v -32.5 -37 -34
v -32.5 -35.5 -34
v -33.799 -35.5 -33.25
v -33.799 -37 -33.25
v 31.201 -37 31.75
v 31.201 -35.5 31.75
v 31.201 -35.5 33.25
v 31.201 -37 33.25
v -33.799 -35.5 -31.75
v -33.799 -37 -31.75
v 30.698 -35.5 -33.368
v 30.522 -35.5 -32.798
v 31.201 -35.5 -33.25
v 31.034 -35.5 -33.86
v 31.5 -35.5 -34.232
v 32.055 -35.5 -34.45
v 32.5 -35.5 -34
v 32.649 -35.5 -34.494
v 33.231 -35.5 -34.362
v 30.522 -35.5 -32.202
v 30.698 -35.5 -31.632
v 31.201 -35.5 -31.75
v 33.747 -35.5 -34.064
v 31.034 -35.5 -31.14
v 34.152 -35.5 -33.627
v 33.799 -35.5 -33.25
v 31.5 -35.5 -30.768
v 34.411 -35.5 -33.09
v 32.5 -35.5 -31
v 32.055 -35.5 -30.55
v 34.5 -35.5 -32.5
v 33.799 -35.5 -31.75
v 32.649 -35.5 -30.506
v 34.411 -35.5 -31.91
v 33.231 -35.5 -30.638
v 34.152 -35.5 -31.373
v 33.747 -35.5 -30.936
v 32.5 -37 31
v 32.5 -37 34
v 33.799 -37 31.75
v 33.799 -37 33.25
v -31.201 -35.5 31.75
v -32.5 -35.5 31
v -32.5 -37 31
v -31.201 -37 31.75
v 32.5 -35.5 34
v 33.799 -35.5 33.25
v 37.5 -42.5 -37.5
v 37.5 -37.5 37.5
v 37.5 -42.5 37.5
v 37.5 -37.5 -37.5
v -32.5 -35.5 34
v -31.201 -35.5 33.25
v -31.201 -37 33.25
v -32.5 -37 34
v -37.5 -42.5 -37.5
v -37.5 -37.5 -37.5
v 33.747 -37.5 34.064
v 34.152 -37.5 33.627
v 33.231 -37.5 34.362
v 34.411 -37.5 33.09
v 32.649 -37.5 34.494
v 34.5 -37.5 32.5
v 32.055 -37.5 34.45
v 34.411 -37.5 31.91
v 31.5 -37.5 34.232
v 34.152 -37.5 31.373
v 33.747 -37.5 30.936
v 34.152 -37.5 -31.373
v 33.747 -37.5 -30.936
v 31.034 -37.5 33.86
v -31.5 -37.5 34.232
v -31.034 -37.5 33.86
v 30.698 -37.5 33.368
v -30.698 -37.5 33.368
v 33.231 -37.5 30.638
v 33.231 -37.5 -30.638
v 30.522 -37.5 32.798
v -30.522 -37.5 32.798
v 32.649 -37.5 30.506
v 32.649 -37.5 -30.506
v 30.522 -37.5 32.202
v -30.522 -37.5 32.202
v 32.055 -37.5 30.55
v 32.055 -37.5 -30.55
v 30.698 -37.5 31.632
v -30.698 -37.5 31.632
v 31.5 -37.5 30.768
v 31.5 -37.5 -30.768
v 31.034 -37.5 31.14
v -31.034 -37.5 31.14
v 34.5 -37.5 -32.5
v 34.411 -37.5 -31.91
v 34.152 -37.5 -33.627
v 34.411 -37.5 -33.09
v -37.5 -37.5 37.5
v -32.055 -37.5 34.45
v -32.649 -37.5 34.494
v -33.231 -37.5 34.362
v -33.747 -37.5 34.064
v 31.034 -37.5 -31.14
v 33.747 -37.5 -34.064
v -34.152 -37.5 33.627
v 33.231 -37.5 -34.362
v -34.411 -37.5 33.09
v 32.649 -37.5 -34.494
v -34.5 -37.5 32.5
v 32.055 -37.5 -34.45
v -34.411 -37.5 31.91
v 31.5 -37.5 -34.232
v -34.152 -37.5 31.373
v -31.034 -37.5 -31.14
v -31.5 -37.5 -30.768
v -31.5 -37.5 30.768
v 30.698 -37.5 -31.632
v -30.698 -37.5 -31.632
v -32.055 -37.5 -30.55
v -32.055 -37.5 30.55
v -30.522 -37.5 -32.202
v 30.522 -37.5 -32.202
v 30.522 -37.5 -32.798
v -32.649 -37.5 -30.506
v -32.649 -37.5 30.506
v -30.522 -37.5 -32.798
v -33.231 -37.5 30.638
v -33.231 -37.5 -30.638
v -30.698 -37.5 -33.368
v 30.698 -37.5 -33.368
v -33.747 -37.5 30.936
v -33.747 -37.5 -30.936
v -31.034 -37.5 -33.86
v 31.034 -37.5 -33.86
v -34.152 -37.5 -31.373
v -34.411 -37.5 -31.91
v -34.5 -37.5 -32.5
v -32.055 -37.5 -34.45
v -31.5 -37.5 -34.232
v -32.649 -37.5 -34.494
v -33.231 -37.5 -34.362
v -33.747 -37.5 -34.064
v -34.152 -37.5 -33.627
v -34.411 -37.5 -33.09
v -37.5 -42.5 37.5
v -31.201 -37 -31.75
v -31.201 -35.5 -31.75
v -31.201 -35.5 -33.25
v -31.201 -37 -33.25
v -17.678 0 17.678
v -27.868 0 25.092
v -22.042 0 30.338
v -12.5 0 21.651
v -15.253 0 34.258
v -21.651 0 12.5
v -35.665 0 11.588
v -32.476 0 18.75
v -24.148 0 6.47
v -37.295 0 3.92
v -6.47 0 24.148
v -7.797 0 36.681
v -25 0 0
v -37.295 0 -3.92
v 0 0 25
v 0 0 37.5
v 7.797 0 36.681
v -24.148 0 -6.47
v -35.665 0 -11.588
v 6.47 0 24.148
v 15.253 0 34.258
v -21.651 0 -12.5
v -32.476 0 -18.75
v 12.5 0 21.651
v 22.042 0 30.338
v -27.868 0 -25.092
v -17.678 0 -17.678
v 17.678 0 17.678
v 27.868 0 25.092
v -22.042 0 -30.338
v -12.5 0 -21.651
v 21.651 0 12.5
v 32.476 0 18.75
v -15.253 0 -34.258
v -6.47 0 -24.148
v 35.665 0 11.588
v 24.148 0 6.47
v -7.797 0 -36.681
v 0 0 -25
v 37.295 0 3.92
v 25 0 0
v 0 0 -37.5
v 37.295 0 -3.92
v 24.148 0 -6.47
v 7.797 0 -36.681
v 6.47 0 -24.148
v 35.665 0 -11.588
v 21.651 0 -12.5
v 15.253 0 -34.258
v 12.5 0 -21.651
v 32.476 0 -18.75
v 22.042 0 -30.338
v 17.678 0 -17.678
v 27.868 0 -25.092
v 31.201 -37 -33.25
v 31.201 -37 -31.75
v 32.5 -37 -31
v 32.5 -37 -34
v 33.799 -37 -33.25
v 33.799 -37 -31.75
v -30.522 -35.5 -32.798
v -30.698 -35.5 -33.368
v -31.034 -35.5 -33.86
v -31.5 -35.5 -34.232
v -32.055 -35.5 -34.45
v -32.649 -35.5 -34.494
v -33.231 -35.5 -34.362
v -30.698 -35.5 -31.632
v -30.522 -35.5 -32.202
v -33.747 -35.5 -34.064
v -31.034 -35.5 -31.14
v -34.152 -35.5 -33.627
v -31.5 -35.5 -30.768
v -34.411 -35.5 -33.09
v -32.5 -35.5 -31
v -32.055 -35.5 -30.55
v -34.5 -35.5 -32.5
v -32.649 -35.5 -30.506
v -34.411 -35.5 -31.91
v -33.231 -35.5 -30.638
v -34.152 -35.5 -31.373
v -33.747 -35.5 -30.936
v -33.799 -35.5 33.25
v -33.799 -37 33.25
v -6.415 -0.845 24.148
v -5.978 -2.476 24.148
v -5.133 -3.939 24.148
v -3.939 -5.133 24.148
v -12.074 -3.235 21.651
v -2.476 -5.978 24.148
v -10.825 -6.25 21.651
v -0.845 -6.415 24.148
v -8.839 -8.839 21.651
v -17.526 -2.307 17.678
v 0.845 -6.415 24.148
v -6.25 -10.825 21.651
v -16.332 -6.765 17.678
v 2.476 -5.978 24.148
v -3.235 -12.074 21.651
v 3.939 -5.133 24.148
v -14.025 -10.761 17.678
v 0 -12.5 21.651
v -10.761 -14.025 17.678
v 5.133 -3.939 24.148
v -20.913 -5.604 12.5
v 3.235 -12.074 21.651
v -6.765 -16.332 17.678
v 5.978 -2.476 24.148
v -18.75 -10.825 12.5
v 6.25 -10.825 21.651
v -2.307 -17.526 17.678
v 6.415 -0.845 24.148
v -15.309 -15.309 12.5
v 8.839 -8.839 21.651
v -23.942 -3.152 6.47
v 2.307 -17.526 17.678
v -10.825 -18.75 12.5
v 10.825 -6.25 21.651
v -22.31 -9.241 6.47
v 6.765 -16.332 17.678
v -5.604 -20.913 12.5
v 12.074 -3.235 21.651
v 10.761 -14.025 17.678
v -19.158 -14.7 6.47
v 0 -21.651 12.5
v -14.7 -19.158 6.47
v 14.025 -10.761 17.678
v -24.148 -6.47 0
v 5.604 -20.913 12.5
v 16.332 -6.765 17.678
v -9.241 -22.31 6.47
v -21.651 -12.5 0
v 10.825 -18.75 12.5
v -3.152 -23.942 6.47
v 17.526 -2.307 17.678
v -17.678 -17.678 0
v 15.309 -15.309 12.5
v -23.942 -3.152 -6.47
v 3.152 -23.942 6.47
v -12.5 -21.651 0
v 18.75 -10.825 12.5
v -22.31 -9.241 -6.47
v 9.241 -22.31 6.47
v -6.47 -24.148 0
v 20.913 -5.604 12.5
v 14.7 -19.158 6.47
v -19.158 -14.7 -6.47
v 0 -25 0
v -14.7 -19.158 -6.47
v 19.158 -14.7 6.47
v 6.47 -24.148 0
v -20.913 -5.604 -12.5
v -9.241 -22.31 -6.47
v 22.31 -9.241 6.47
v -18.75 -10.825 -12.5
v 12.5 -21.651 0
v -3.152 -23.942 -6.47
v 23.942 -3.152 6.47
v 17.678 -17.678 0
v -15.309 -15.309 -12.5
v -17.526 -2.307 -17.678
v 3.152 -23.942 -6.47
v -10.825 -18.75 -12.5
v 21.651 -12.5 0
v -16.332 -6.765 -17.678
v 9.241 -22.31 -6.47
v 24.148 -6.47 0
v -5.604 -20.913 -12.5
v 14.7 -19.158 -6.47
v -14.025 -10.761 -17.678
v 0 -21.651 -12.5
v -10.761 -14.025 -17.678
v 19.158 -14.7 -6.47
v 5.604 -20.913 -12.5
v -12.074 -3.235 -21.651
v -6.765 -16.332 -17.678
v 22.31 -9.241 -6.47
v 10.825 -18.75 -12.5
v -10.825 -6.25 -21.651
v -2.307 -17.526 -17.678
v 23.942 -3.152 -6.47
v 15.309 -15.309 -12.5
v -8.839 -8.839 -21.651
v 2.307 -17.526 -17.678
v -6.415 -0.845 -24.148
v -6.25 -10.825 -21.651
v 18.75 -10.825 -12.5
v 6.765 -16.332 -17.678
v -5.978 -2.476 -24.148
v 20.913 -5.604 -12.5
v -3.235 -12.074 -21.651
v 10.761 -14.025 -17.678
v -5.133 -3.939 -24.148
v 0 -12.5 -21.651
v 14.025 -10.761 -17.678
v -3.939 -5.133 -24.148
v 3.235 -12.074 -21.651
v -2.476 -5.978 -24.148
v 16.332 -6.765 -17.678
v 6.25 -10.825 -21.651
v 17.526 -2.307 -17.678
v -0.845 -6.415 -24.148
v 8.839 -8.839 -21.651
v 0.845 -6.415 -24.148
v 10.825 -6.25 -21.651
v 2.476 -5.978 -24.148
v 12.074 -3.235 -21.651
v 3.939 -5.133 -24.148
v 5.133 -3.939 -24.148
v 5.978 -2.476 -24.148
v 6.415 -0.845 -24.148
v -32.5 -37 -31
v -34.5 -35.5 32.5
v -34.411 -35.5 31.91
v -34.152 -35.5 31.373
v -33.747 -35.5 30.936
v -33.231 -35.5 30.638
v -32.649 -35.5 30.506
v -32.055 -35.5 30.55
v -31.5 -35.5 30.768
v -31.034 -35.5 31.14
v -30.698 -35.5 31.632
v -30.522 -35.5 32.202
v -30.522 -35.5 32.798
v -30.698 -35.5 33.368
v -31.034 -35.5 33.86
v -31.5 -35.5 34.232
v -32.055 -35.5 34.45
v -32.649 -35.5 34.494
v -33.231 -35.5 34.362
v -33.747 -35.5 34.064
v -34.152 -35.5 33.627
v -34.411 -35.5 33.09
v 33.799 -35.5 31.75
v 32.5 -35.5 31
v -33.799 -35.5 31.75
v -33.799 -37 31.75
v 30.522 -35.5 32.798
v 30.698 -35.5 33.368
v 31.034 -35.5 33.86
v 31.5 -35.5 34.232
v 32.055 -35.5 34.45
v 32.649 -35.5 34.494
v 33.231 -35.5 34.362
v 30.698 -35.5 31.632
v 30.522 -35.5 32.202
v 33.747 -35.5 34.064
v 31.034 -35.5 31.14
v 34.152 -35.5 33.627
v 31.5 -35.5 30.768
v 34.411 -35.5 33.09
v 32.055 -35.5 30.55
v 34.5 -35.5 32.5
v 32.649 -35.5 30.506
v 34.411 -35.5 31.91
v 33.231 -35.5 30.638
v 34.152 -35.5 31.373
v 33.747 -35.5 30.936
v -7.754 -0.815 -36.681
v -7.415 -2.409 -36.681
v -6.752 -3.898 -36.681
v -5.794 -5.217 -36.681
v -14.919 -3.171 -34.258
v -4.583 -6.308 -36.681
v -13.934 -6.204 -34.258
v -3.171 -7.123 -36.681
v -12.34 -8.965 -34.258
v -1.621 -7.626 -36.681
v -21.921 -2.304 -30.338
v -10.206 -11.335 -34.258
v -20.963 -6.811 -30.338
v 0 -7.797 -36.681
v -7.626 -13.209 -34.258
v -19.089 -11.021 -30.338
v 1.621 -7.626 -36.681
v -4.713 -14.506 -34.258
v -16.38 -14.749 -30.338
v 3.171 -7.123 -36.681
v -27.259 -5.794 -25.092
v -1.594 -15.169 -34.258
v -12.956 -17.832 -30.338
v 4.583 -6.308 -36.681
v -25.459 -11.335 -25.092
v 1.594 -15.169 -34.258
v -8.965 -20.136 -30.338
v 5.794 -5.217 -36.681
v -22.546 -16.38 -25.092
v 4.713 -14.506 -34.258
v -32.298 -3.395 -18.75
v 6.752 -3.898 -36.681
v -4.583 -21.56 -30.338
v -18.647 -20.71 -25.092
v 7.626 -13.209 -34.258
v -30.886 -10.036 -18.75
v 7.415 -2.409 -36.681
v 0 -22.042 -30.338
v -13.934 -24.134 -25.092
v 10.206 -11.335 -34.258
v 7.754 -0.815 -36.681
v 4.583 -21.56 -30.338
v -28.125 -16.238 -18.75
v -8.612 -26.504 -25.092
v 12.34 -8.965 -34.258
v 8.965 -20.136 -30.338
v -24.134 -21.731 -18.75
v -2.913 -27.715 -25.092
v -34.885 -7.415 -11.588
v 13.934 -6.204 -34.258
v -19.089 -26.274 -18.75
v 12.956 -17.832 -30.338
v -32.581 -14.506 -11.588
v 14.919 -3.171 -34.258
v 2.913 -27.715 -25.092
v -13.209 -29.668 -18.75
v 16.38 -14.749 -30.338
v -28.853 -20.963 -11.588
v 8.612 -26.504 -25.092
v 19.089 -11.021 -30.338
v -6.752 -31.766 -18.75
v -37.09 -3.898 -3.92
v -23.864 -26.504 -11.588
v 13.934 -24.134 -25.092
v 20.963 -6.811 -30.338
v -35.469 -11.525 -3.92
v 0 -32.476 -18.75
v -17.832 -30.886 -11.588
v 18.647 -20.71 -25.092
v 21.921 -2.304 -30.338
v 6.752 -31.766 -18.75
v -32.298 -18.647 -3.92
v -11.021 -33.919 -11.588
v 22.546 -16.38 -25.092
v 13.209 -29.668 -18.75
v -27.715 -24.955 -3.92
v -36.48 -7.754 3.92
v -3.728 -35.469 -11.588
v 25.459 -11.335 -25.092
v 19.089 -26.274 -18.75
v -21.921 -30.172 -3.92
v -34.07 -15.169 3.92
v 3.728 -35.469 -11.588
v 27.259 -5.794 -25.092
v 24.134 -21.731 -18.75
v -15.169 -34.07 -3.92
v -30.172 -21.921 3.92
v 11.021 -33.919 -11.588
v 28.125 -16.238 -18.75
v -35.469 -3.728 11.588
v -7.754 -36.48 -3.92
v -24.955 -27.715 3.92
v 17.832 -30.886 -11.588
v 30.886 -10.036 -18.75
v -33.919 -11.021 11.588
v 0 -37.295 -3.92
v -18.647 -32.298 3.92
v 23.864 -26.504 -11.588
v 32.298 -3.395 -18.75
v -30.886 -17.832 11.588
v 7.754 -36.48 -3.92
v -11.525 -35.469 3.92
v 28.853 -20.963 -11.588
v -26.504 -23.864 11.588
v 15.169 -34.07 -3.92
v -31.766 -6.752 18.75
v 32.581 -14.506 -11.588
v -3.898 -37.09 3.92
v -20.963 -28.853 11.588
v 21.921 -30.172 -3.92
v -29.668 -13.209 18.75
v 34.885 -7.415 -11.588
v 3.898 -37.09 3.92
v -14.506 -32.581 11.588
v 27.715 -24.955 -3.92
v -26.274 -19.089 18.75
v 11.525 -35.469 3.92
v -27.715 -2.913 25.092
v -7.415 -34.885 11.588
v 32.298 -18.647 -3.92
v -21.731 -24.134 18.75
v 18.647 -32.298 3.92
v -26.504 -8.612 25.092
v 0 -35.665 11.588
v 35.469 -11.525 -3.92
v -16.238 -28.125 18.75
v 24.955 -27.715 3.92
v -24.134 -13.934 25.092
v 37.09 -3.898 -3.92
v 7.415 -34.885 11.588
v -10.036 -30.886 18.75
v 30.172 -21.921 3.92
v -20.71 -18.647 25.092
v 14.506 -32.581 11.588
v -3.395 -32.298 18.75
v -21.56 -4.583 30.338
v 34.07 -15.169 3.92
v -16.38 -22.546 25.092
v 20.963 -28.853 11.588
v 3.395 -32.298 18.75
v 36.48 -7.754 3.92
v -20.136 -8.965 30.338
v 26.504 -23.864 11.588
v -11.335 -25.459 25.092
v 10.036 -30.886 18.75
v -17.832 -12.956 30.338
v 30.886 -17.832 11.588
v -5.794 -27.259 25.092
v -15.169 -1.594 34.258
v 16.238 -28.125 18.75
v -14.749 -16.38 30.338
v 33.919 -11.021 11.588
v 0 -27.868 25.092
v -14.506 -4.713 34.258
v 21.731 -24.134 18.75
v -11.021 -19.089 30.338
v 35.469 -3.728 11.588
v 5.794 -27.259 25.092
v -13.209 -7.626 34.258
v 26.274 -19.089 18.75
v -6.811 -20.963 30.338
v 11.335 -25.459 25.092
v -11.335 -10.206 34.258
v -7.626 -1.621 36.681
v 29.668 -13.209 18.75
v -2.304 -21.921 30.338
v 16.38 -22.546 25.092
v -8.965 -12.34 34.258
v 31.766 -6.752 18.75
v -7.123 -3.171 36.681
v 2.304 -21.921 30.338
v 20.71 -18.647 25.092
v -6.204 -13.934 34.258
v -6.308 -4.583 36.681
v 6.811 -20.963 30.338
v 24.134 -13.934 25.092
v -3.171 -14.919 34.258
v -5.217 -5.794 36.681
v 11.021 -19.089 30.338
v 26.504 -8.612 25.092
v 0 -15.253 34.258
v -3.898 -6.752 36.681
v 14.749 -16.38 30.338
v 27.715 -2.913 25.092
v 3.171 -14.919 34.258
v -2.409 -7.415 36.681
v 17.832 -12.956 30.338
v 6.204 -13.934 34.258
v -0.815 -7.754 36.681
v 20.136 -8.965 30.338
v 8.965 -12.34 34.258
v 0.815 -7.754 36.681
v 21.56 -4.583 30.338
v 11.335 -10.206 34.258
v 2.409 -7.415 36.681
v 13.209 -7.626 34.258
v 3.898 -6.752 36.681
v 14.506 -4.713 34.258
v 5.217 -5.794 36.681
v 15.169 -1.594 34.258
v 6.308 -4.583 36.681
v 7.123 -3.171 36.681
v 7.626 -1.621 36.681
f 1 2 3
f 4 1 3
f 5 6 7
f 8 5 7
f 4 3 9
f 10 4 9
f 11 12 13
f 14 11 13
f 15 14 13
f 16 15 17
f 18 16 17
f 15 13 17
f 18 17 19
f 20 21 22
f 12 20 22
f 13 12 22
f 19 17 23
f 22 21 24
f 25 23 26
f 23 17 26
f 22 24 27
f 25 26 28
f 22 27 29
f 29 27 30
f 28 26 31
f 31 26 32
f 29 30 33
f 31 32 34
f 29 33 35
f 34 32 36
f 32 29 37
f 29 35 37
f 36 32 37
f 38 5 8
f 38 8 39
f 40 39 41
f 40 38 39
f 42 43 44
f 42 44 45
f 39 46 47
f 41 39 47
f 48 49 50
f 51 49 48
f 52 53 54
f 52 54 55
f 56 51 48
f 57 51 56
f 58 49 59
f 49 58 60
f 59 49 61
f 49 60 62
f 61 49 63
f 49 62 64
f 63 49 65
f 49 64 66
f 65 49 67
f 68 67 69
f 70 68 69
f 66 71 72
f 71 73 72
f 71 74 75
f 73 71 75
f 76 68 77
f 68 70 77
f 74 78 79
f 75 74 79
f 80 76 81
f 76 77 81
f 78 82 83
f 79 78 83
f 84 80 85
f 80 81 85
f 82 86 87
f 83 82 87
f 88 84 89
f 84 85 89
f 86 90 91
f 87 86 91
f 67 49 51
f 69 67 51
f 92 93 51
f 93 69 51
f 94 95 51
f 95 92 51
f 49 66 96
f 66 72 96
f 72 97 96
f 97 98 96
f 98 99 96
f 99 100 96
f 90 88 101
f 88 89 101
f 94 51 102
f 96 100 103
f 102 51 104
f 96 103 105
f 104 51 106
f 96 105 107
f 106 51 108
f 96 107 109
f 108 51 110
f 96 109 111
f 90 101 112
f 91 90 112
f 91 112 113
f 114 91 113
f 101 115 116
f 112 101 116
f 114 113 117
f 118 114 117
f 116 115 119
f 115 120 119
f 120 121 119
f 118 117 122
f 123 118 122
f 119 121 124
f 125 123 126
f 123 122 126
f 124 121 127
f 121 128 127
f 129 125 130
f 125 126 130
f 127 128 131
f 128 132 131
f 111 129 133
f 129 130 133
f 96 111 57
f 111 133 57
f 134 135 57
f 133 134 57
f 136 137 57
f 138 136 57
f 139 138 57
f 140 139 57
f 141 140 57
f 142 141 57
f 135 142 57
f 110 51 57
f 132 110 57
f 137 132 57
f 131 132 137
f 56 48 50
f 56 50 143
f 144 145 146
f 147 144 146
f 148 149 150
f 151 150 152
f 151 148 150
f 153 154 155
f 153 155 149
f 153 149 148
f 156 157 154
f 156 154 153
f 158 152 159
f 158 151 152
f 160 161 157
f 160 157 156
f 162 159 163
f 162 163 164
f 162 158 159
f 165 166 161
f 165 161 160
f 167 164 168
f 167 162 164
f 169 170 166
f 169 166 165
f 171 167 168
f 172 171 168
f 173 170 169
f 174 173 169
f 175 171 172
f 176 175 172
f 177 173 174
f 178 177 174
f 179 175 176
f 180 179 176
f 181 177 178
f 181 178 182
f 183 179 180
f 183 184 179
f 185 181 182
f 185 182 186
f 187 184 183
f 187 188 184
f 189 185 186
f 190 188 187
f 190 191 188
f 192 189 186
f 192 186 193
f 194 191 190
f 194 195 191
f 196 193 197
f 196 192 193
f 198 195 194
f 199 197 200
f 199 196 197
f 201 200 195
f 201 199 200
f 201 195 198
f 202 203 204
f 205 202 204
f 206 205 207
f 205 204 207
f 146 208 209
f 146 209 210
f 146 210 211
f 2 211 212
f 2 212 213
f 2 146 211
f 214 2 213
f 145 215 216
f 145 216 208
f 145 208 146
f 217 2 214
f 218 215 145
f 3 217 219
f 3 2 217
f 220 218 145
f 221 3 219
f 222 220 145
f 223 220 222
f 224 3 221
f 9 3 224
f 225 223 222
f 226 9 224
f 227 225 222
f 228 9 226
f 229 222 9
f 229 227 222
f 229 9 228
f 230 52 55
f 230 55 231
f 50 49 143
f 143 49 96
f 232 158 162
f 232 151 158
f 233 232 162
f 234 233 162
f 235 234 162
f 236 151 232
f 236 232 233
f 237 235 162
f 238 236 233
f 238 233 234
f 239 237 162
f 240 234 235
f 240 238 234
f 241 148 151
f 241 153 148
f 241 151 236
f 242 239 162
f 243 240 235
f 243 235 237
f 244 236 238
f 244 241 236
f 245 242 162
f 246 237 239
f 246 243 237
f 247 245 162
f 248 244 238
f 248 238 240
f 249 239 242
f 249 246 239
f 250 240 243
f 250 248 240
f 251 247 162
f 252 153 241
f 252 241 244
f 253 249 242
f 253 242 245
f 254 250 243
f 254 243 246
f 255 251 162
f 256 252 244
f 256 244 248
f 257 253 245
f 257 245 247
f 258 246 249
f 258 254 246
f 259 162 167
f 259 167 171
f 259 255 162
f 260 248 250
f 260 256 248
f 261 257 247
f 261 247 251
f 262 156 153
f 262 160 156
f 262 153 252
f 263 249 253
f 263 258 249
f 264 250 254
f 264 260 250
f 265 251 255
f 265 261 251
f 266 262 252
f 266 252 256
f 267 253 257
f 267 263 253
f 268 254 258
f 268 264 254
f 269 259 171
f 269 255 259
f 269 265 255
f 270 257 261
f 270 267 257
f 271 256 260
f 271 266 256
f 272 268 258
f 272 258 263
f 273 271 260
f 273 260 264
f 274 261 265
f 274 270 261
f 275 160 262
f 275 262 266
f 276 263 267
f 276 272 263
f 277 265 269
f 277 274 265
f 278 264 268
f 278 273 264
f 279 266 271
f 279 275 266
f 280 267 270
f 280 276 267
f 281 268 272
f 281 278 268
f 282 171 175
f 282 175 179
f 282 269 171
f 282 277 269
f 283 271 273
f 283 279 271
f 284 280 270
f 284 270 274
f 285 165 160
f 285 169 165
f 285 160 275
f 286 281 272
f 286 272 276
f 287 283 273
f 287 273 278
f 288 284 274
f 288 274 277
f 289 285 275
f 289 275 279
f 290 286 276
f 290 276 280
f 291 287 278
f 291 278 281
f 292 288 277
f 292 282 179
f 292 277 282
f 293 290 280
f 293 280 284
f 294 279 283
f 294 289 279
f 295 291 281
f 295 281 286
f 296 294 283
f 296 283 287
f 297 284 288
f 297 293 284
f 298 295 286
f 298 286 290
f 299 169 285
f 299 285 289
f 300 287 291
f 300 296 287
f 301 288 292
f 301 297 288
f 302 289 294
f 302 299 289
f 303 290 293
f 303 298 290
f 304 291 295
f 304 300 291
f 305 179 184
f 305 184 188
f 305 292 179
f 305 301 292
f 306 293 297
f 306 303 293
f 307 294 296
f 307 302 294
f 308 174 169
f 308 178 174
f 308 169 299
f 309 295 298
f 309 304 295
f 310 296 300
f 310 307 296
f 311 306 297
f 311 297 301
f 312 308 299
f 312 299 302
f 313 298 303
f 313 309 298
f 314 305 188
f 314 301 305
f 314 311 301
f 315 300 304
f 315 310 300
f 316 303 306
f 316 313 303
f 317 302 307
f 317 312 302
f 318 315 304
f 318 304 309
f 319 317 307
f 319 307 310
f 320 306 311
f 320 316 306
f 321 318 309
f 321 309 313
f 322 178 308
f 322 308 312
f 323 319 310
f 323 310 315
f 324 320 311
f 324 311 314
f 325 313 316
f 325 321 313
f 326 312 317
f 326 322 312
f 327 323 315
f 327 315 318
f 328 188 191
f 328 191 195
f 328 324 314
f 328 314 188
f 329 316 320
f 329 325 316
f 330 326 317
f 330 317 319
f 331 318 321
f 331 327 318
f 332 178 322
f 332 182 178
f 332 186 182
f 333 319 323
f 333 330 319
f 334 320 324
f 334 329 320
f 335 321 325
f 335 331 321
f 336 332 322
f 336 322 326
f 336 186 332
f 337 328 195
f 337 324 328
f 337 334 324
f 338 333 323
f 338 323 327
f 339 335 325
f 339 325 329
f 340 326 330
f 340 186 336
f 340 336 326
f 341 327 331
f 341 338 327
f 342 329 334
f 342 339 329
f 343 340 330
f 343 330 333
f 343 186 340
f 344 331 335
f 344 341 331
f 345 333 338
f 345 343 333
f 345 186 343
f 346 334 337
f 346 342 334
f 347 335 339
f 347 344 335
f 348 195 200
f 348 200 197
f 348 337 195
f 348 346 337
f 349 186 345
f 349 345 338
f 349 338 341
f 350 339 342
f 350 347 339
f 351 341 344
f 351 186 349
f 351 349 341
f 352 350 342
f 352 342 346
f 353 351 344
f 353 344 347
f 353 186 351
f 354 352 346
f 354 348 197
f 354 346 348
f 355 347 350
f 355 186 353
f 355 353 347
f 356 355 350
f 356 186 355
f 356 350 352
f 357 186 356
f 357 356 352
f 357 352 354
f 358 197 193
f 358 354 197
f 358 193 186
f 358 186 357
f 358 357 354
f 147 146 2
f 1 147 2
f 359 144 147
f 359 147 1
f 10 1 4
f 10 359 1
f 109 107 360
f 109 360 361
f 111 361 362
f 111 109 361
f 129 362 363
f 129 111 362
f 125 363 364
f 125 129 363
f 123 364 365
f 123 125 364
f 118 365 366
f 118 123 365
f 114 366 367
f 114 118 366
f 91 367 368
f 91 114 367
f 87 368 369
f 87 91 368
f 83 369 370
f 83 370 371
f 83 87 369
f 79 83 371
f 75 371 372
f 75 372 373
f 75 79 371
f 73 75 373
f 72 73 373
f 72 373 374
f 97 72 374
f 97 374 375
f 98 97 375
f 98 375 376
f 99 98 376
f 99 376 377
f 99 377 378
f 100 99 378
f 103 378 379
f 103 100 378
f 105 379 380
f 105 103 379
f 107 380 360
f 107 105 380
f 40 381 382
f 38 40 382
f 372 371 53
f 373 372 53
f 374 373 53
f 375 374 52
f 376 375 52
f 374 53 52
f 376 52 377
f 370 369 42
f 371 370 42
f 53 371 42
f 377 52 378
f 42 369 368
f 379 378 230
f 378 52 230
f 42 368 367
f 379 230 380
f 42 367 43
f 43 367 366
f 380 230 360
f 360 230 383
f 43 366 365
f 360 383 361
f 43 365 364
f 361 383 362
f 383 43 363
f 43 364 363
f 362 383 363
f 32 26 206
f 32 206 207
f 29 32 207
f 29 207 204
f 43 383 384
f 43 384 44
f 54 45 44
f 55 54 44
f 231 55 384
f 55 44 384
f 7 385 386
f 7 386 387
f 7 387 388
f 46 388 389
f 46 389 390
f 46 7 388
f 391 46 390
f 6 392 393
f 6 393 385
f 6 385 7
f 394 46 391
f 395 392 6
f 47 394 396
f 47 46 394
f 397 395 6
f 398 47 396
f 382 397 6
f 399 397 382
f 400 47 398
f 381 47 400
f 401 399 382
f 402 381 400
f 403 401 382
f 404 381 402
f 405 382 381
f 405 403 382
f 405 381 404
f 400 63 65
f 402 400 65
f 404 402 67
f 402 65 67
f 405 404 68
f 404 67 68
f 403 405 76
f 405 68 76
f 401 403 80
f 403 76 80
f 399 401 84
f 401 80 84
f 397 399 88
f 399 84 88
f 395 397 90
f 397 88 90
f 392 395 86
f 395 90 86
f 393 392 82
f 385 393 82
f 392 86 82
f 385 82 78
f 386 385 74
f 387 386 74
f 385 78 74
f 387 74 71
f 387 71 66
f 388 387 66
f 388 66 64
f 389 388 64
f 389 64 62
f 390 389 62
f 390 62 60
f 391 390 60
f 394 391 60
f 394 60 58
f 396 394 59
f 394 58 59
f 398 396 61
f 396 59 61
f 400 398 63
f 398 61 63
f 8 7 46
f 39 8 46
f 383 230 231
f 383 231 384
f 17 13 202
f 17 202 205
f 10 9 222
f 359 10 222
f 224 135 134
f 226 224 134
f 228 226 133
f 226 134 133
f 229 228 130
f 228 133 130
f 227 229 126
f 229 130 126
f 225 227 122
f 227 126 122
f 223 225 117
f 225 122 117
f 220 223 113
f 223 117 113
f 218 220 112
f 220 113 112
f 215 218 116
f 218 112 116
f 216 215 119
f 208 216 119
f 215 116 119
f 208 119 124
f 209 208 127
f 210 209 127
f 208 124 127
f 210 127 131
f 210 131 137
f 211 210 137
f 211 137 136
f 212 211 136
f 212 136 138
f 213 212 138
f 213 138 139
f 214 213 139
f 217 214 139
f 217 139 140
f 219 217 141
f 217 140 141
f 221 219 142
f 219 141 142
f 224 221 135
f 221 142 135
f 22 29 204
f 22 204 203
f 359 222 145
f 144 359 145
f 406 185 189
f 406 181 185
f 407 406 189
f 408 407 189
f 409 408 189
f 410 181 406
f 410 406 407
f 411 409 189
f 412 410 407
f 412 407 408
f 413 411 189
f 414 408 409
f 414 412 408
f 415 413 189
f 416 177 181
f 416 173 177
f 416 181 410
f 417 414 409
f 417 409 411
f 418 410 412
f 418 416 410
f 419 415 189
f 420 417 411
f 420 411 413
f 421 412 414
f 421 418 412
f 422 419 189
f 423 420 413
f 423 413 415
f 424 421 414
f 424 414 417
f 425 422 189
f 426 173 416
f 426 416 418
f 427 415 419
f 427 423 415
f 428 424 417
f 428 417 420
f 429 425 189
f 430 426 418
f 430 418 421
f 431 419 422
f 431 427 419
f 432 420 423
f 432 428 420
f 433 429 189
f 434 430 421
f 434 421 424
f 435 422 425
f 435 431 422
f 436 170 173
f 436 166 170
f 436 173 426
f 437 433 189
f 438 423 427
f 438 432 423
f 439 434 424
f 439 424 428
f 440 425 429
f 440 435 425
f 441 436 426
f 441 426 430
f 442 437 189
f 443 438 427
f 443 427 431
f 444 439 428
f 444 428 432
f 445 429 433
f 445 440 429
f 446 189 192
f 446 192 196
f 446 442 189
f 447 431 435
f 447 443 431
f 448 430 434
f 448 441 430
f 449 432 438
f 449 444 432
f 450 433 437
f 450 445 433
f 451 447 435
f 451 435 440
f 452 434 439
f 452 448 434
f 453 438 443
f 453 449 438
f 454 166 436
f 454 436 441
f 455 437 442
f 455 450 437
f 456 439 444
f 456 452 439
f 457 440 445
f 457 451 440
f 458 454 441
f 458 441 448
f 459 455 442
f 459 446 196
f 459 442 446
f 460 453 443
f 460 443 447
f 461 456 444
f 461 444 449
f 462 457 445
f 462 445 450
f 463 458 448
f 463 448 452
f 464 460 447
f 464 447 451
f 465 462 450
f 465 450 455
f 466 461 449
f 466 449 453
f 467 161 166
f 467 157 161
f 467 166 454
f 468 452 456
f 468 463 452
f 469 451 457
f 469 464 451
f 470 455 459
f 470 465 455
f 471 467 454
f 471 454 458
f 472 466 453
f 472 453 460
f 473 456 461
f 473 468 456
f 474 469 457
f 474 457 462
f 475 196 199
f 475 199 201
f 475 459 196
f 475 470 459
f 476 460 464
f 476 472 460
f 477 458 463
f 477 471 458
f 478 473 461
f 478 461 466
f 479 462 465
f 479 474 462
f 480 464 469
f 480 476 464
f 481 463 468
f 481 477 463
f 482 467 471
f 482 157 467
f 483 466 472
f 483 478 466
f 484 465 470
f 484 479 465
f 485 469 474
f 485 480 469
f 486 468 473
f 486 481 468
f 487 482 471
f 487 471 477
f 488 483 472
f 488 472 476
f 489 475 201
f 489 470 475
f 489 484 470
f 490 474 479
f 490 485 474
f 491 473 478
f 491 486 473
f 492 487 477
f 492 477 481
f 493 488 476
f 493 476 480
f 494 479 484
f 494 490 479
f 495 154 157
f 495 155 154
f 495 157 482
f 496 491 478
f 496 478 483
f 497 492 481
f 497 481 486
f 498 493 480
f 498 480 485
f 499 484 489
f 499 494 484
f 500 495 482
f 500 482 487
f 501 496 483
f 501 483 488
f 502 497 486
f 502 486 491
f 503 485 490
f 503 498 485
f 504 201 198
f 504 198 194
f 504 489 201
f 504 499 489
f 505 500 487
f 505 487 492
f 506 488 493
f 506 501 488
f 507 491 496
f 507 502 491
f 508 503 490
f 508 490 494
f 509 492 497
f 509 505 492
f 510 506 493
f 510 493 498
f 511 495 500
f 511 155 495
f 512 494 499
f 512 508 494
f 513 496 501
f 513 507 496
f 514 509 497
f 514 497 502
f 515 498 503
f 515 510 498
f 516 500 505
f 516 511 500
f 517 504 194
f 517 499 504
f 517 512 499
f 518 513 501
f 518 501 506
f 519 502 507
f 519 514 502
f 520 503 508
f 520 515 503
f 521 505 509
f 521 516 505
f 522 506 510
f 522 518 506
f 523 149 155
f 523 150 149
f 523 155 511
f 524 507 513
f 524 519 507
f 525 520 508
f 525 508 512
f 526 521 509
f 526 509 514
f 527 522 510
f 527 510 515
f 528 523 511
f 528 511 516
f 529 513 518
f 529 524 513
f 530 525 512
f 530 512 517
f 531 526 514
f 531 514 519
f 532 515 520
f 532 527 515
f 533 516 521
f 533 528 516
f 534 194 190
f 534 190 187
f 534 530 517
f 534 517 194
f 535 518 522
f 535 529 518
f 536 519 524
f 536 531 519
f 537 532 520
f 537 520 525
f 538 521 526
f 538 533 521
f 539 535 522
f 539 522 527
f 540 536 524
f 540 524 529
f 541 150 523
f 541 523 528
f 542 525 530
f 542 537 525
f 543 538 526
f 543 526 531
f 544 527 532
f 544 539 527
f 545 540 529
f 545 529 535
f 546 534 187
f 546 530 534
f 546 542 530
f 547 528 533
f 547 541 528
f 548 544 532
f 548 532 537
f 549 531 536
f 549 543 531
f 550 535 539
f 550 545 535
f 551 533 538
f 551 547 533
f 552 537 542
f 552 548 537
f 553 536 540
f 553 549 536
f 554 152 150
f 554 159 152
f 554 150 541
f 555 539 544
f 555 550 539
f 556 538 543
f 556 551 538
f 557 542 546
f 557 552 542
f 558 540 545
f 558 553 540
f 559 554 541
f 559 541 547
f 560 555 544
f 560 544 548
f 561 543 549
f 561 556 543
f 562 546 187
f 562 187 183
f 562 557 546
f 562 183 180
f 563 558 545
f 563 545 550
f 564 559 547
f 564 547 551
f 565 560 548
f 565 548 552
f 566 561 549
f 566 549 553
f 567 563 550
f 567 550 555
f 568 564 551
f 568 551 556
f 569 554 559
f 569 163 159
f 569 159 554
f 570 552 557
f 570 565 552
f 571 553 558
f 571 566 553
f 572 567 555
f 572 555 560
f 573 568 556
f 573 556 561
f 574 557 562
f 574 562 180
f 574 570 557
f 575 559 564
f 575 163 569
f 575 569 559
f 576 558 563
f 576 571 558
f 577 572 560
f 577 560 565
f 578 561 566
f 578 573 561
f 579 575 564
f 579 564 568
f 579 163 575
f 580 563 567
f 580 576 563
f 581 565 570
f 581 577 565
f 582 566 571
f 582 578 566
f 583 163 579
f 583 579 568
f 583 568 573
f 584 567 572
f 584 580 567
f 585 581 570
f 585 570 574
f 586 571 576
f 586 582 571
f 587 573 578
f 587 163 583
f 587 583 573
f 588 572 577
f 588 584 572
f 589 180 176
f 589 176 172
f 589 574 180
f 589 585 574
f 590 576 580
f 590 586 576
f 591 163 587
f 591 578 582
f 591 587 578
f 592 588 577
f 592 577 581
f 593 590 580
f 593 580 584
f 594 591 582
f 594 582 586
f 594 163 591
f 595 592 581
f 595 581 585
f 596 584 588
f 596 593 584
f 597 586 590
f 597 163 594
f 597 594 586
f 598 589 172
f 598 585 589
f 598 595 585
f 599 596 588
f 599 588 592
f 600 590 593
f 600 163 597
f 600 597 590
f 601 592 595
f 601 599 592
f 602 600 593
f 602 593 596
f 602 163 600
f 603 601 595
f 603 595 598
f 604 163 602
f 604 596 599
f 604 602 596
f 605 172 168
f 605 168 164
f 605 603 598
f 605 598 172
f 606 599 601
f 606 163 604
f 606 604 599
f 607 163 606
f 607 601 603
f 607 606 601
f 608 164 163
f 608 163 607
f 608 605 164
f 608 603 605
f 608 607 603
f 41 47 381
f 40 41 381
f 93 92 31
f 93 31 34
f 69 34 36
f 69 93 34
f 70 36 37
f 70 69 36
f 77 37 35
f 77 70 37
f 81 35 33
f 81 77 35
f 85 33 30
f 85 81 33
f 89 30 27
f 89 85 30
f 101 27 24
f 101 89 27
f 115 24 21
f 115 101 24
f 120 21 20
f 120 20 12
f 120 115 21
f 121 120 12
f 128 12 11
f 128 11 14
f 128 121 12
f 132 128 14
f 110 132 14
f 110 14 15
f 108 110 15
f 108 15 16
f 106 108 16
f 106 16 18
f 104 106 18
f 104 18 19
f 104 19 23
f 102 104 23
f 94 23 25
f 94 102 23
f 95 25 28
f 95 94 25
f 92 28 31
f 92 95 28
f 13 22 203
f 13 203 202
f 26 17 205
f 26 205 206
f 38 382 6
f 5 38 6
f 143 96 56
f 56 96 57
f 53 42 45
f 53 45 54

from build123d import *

# Parameters (mm, degrees)
REVOLVE3_ANGLE          = 180
SKETCH2_W               = 75
SKETCH2_H               = 75
BOSS_EXTRUDE1_DEPTH     = 5
SKETCH3_R               = 1.5
CUT_EXTRUDE1_DEPTH      = 5
SKETCH4_R               = 2
BOSS_EXTRUDE2_DEPTH     = 2
CUT_EXTRUDE2_DEPTH      = 1.5
BOSS_EXTRUDE3_REACH     = 69.961
SKETCH6_R               = 1.5
MIRROR2_COPY_1_SKETCH_R = 1.5
MIRROR2_COPY_1_DEPTH    = 5
MIRROR2_COPY_2_SKETCH_R = 2
MIRROR2_COPY_2_DEPTH    = 2
MIRROR2_COPY_3_DEPTH    = 1.5
MIRROR2_COPY_4_REACH    = 69.961
MIRROR2_COPY_4_SKETCH_R = 1.5
MIRROR2_COPY_5_SKETCH_R = 1.5
MIRROR2_COPY_5_DEPTH    = 5
MIRROR2_COPY_6_REACH    = 69.961
MIRROR2_COPY_6_SKETCH_R = 1.5


with BuildPart() as part:
    # Sketch1 → Revolve3 (revolve)
    with BuildSketch(Plane(origin=(0, 0, 0), x_dir=(1, 0, 0), z_dir=(0, 1, 0))):
        with BuildLine():
            Line((0, 25), (0, 37.5))
            ThreePointArc((0, 37.5), (-37.5, 0), (0, -37.5))
            Line((0, -37.5), (0, -25))
            ThreePointArc((0, -25), (-25, 0), (0, 25))
        make_face()
    revolve(axis=Axis((0, 0, -18.61408832), (0, 0, 1)), revolution_arc=REVOLVE3_ANGLE)


with BuildPart() as body_2:
    # Sketch2 → Boss-Extrude1 (new body)
    with BuildSketch(Plane(origin=(0, -37.5, 0), x_dir=(-1, 0, 0), z_dir=(0, -1, 0))):
        Rectangle(SKETCH2_W, SKETCH2_H)
    extrude(amount=BOSS_EXTRUDE1_DEPTH)

    # Sketch3 → Cut-Extrude1 (cut)
    with BuildSketch(Plane(origin=(0, -37.5, 0), x_dir=(1, 0, 0), z_dir=(0, 1, 0))):
        with Locations(Location((32.5, -32.5, 0), (0, 0, 180))):
            Circle(SKETCH3_R)
    cut_extrude1 = extrude(amount=-CUT_EXTRUDE1_DEPTH, mode=Mode.SUBTRACT)

    # Sketch4 → Boss-Extrude2 (add)
    with BuildSketch(Plane(origin=(0, -37.5, 0), x_dir=(1, 0, 0), z_dir=(0, 1, 0))):
        with Locations((32.5, -32.5)):
            Circle(SKETCH4_R)
    boss_extrude2 = extrude(amount=BOSS_EXTRUDE2_DEPTH)

    # Sketch5 → Cut-Extrude2 (cut)
    with BuildSketch(Plane(origin=(0, -35.5, 0), x_dir=(1, 0, 0), z_dir=(0, 1, 0))):
        Polygon((31.200961894, -31.75), (31.200961894, -33.25), (32.5, -34), (33.799038106, -33.25), (33.799038106, -31.75), (32.5, -31), align=None)
    cut_extrude2 = extrude(amount=-CUT_EXTRUDE2_DEPTH, mode=Mode.SUBTRACT)

    # Sketch6 → Boss-Extrude3 (add, up to next)
    with BuildSketch(Plane.XZ.offset(42.5), mode=Mode.PRIVATE) as boss_extrude3_sk1:
        with Locations((32.5, 32.5)):
            Circle(SKETCH6_R)
    boss_extrude3_tool1 = extrude(boss_extrude3_sk1.sketch, amount=-BOSS_EXTRUDE3_REACH, mode=Mode.PRIVATE) - body_2.part
    boss_extrude3 = boss_extrude3_tool1.solids().sort_by_distance((32.5, -42.5, 32.5))[0]
    add(boss_extrude3)

    # Mirror1: Cut-Extrude1, Boss-Extrude2, Cut-Extrude2, Boss-Extrude3 across plane
    add(cut_extrude1.mirror(Plane.XY), mode=Mode.SUBTRACT)
    add(boss_extrude2.mirror(Plane.XY))
    add(cut_extrude2.mirror(Plane.XY), mode=Mode.SUBTRACT)
    add(boss_extrude3.mirror(Plane.XY))

    # Mirror2: Boss-Extrude2, Cut-Extrude2 across plane
    add(boss_extrude2.mirror(Plane(origin=(0, 0, 0), x_dir=(0, 0, 1), z_dir=(1, 0, 0))))
    add(cut_extrude2.mirror(Plane(origin=(0, 0, 0), x_dir=(0, 0, 1), z_dir=(1, 0, 0))), mode=Mode.SUBTRACT)

    # Mirror2 copy 1 sketch → Mirror2 copy 1 (cut)
    with BuildSketch(Plane(origin=(0, -37.5, 0), x_dir=(-1, 0, 0), z_dir=(0, 1, 0))):
        with Locations(Location((32.5, -32.5, 0), (0, 0, 180))):
            Circle(MIRROR2_COPY_1_SKETCH_R)
    extrude(amount=-MIRROR2_COPY_1_DEPTH, mode=Mode.SUBTRACT)

    # Mirror2 copy 2 sketch → Mirror2 copy 2 (add)
    with BuildSketch(Plane(origin=(0, -37.5, 0), x_dir=(-1, 0, 0), z_dir=(0, 1, 0))):
        with Locations((32.5, -32.5)):
            Circle(MIRROR2_COPY_2_SKETCH_R)
    extrude(amount=MIRROR2_COPY_2_DEPTH)

    # Mirror2 copy 3 sketch → Mirror2 copy 3 (cut)
    with BuildSketch(Plane(origin=(0, -35.5, 0), x_dir=(-1, 0, 0), z_dir=(0, 1, 0))):
        Polygon((31.200961894, -31.75), (31.200961894, -33.25), (32.5, -34), (33.799038106, -33.25), (33.799038106, -31.75), (32.5, -31), align=None)
    extrude(amount=-MIRROR2_COPY_3_DEPTH, mode=Mode.SUBTRACT)

    # Mirror2 copy 4 sketch → Mirror2 copy 4 (add, up to next)
    with BuildSketch(Plane(origin=(0, -42.5, 0), x_dir=(-1, 0, 0), z_dir=(0, -1, 0)), mode=Mode.PRIVATE) as mirror2_copy_4_sk1:
        with Locations((32.5, 32.5)):
            Circle(MIRROR2_COPY_4_SKETCH_R)
    mirror2_copy_4_tool1 = extrude(mirror2_copy_4_sk1.sketch, amount=-MIRROR2_COPY_4_REACH, mode=Mode.PRIVATE) - body_2.part
    add(mirror2_copy_4_tool1.solids().sort_by_distance((-32.5, -42.5, -32.5))[0])

    # Mirror2 copy 5 sketch → Mirror2 copy 5 (cut)
    with BuildSketch(Plane(origin=(0, -37.5, 0), x_dir=(-1, 0, 0), z_dir=(0, 1, 0))):
        with Locations((32.5, 32.5)):
            Circle(MIRROR2_COPY_5_SKETCH_R)
    extrude(amount=-MIRROR2_COPY_5_DEPTH, mode=Mode.SUBTRACT)

    # Mirror2 copy 6 sketch → Mirror2 copy 6 (add, up to next)
    with BuildSketch(Plane(origin=(0, -42.5, 0), x_dir=(-1, 0, 0), z_dir=(0, -1, 0)), mode=Mode.PRIVATE) as mirror2_copy_6_sk1:
        with Locations((32.5, -32.5)):
            Circle(MIRROR2_COPY_6_SKETCH_R)
    mirror2_copy_6_tool1 = extrude(mirror2_copy_6_sk1.sketch, amount=-MIRROR2_COPY_6_REACH, mode=Mode.PRIVATE) - body_2.part
    add(mirror2_copy_6_tool1.solids().sort_by_distance((-32.5, -42.5, 32.5))[0])


solid = Compound([part.part, body_2.part])
